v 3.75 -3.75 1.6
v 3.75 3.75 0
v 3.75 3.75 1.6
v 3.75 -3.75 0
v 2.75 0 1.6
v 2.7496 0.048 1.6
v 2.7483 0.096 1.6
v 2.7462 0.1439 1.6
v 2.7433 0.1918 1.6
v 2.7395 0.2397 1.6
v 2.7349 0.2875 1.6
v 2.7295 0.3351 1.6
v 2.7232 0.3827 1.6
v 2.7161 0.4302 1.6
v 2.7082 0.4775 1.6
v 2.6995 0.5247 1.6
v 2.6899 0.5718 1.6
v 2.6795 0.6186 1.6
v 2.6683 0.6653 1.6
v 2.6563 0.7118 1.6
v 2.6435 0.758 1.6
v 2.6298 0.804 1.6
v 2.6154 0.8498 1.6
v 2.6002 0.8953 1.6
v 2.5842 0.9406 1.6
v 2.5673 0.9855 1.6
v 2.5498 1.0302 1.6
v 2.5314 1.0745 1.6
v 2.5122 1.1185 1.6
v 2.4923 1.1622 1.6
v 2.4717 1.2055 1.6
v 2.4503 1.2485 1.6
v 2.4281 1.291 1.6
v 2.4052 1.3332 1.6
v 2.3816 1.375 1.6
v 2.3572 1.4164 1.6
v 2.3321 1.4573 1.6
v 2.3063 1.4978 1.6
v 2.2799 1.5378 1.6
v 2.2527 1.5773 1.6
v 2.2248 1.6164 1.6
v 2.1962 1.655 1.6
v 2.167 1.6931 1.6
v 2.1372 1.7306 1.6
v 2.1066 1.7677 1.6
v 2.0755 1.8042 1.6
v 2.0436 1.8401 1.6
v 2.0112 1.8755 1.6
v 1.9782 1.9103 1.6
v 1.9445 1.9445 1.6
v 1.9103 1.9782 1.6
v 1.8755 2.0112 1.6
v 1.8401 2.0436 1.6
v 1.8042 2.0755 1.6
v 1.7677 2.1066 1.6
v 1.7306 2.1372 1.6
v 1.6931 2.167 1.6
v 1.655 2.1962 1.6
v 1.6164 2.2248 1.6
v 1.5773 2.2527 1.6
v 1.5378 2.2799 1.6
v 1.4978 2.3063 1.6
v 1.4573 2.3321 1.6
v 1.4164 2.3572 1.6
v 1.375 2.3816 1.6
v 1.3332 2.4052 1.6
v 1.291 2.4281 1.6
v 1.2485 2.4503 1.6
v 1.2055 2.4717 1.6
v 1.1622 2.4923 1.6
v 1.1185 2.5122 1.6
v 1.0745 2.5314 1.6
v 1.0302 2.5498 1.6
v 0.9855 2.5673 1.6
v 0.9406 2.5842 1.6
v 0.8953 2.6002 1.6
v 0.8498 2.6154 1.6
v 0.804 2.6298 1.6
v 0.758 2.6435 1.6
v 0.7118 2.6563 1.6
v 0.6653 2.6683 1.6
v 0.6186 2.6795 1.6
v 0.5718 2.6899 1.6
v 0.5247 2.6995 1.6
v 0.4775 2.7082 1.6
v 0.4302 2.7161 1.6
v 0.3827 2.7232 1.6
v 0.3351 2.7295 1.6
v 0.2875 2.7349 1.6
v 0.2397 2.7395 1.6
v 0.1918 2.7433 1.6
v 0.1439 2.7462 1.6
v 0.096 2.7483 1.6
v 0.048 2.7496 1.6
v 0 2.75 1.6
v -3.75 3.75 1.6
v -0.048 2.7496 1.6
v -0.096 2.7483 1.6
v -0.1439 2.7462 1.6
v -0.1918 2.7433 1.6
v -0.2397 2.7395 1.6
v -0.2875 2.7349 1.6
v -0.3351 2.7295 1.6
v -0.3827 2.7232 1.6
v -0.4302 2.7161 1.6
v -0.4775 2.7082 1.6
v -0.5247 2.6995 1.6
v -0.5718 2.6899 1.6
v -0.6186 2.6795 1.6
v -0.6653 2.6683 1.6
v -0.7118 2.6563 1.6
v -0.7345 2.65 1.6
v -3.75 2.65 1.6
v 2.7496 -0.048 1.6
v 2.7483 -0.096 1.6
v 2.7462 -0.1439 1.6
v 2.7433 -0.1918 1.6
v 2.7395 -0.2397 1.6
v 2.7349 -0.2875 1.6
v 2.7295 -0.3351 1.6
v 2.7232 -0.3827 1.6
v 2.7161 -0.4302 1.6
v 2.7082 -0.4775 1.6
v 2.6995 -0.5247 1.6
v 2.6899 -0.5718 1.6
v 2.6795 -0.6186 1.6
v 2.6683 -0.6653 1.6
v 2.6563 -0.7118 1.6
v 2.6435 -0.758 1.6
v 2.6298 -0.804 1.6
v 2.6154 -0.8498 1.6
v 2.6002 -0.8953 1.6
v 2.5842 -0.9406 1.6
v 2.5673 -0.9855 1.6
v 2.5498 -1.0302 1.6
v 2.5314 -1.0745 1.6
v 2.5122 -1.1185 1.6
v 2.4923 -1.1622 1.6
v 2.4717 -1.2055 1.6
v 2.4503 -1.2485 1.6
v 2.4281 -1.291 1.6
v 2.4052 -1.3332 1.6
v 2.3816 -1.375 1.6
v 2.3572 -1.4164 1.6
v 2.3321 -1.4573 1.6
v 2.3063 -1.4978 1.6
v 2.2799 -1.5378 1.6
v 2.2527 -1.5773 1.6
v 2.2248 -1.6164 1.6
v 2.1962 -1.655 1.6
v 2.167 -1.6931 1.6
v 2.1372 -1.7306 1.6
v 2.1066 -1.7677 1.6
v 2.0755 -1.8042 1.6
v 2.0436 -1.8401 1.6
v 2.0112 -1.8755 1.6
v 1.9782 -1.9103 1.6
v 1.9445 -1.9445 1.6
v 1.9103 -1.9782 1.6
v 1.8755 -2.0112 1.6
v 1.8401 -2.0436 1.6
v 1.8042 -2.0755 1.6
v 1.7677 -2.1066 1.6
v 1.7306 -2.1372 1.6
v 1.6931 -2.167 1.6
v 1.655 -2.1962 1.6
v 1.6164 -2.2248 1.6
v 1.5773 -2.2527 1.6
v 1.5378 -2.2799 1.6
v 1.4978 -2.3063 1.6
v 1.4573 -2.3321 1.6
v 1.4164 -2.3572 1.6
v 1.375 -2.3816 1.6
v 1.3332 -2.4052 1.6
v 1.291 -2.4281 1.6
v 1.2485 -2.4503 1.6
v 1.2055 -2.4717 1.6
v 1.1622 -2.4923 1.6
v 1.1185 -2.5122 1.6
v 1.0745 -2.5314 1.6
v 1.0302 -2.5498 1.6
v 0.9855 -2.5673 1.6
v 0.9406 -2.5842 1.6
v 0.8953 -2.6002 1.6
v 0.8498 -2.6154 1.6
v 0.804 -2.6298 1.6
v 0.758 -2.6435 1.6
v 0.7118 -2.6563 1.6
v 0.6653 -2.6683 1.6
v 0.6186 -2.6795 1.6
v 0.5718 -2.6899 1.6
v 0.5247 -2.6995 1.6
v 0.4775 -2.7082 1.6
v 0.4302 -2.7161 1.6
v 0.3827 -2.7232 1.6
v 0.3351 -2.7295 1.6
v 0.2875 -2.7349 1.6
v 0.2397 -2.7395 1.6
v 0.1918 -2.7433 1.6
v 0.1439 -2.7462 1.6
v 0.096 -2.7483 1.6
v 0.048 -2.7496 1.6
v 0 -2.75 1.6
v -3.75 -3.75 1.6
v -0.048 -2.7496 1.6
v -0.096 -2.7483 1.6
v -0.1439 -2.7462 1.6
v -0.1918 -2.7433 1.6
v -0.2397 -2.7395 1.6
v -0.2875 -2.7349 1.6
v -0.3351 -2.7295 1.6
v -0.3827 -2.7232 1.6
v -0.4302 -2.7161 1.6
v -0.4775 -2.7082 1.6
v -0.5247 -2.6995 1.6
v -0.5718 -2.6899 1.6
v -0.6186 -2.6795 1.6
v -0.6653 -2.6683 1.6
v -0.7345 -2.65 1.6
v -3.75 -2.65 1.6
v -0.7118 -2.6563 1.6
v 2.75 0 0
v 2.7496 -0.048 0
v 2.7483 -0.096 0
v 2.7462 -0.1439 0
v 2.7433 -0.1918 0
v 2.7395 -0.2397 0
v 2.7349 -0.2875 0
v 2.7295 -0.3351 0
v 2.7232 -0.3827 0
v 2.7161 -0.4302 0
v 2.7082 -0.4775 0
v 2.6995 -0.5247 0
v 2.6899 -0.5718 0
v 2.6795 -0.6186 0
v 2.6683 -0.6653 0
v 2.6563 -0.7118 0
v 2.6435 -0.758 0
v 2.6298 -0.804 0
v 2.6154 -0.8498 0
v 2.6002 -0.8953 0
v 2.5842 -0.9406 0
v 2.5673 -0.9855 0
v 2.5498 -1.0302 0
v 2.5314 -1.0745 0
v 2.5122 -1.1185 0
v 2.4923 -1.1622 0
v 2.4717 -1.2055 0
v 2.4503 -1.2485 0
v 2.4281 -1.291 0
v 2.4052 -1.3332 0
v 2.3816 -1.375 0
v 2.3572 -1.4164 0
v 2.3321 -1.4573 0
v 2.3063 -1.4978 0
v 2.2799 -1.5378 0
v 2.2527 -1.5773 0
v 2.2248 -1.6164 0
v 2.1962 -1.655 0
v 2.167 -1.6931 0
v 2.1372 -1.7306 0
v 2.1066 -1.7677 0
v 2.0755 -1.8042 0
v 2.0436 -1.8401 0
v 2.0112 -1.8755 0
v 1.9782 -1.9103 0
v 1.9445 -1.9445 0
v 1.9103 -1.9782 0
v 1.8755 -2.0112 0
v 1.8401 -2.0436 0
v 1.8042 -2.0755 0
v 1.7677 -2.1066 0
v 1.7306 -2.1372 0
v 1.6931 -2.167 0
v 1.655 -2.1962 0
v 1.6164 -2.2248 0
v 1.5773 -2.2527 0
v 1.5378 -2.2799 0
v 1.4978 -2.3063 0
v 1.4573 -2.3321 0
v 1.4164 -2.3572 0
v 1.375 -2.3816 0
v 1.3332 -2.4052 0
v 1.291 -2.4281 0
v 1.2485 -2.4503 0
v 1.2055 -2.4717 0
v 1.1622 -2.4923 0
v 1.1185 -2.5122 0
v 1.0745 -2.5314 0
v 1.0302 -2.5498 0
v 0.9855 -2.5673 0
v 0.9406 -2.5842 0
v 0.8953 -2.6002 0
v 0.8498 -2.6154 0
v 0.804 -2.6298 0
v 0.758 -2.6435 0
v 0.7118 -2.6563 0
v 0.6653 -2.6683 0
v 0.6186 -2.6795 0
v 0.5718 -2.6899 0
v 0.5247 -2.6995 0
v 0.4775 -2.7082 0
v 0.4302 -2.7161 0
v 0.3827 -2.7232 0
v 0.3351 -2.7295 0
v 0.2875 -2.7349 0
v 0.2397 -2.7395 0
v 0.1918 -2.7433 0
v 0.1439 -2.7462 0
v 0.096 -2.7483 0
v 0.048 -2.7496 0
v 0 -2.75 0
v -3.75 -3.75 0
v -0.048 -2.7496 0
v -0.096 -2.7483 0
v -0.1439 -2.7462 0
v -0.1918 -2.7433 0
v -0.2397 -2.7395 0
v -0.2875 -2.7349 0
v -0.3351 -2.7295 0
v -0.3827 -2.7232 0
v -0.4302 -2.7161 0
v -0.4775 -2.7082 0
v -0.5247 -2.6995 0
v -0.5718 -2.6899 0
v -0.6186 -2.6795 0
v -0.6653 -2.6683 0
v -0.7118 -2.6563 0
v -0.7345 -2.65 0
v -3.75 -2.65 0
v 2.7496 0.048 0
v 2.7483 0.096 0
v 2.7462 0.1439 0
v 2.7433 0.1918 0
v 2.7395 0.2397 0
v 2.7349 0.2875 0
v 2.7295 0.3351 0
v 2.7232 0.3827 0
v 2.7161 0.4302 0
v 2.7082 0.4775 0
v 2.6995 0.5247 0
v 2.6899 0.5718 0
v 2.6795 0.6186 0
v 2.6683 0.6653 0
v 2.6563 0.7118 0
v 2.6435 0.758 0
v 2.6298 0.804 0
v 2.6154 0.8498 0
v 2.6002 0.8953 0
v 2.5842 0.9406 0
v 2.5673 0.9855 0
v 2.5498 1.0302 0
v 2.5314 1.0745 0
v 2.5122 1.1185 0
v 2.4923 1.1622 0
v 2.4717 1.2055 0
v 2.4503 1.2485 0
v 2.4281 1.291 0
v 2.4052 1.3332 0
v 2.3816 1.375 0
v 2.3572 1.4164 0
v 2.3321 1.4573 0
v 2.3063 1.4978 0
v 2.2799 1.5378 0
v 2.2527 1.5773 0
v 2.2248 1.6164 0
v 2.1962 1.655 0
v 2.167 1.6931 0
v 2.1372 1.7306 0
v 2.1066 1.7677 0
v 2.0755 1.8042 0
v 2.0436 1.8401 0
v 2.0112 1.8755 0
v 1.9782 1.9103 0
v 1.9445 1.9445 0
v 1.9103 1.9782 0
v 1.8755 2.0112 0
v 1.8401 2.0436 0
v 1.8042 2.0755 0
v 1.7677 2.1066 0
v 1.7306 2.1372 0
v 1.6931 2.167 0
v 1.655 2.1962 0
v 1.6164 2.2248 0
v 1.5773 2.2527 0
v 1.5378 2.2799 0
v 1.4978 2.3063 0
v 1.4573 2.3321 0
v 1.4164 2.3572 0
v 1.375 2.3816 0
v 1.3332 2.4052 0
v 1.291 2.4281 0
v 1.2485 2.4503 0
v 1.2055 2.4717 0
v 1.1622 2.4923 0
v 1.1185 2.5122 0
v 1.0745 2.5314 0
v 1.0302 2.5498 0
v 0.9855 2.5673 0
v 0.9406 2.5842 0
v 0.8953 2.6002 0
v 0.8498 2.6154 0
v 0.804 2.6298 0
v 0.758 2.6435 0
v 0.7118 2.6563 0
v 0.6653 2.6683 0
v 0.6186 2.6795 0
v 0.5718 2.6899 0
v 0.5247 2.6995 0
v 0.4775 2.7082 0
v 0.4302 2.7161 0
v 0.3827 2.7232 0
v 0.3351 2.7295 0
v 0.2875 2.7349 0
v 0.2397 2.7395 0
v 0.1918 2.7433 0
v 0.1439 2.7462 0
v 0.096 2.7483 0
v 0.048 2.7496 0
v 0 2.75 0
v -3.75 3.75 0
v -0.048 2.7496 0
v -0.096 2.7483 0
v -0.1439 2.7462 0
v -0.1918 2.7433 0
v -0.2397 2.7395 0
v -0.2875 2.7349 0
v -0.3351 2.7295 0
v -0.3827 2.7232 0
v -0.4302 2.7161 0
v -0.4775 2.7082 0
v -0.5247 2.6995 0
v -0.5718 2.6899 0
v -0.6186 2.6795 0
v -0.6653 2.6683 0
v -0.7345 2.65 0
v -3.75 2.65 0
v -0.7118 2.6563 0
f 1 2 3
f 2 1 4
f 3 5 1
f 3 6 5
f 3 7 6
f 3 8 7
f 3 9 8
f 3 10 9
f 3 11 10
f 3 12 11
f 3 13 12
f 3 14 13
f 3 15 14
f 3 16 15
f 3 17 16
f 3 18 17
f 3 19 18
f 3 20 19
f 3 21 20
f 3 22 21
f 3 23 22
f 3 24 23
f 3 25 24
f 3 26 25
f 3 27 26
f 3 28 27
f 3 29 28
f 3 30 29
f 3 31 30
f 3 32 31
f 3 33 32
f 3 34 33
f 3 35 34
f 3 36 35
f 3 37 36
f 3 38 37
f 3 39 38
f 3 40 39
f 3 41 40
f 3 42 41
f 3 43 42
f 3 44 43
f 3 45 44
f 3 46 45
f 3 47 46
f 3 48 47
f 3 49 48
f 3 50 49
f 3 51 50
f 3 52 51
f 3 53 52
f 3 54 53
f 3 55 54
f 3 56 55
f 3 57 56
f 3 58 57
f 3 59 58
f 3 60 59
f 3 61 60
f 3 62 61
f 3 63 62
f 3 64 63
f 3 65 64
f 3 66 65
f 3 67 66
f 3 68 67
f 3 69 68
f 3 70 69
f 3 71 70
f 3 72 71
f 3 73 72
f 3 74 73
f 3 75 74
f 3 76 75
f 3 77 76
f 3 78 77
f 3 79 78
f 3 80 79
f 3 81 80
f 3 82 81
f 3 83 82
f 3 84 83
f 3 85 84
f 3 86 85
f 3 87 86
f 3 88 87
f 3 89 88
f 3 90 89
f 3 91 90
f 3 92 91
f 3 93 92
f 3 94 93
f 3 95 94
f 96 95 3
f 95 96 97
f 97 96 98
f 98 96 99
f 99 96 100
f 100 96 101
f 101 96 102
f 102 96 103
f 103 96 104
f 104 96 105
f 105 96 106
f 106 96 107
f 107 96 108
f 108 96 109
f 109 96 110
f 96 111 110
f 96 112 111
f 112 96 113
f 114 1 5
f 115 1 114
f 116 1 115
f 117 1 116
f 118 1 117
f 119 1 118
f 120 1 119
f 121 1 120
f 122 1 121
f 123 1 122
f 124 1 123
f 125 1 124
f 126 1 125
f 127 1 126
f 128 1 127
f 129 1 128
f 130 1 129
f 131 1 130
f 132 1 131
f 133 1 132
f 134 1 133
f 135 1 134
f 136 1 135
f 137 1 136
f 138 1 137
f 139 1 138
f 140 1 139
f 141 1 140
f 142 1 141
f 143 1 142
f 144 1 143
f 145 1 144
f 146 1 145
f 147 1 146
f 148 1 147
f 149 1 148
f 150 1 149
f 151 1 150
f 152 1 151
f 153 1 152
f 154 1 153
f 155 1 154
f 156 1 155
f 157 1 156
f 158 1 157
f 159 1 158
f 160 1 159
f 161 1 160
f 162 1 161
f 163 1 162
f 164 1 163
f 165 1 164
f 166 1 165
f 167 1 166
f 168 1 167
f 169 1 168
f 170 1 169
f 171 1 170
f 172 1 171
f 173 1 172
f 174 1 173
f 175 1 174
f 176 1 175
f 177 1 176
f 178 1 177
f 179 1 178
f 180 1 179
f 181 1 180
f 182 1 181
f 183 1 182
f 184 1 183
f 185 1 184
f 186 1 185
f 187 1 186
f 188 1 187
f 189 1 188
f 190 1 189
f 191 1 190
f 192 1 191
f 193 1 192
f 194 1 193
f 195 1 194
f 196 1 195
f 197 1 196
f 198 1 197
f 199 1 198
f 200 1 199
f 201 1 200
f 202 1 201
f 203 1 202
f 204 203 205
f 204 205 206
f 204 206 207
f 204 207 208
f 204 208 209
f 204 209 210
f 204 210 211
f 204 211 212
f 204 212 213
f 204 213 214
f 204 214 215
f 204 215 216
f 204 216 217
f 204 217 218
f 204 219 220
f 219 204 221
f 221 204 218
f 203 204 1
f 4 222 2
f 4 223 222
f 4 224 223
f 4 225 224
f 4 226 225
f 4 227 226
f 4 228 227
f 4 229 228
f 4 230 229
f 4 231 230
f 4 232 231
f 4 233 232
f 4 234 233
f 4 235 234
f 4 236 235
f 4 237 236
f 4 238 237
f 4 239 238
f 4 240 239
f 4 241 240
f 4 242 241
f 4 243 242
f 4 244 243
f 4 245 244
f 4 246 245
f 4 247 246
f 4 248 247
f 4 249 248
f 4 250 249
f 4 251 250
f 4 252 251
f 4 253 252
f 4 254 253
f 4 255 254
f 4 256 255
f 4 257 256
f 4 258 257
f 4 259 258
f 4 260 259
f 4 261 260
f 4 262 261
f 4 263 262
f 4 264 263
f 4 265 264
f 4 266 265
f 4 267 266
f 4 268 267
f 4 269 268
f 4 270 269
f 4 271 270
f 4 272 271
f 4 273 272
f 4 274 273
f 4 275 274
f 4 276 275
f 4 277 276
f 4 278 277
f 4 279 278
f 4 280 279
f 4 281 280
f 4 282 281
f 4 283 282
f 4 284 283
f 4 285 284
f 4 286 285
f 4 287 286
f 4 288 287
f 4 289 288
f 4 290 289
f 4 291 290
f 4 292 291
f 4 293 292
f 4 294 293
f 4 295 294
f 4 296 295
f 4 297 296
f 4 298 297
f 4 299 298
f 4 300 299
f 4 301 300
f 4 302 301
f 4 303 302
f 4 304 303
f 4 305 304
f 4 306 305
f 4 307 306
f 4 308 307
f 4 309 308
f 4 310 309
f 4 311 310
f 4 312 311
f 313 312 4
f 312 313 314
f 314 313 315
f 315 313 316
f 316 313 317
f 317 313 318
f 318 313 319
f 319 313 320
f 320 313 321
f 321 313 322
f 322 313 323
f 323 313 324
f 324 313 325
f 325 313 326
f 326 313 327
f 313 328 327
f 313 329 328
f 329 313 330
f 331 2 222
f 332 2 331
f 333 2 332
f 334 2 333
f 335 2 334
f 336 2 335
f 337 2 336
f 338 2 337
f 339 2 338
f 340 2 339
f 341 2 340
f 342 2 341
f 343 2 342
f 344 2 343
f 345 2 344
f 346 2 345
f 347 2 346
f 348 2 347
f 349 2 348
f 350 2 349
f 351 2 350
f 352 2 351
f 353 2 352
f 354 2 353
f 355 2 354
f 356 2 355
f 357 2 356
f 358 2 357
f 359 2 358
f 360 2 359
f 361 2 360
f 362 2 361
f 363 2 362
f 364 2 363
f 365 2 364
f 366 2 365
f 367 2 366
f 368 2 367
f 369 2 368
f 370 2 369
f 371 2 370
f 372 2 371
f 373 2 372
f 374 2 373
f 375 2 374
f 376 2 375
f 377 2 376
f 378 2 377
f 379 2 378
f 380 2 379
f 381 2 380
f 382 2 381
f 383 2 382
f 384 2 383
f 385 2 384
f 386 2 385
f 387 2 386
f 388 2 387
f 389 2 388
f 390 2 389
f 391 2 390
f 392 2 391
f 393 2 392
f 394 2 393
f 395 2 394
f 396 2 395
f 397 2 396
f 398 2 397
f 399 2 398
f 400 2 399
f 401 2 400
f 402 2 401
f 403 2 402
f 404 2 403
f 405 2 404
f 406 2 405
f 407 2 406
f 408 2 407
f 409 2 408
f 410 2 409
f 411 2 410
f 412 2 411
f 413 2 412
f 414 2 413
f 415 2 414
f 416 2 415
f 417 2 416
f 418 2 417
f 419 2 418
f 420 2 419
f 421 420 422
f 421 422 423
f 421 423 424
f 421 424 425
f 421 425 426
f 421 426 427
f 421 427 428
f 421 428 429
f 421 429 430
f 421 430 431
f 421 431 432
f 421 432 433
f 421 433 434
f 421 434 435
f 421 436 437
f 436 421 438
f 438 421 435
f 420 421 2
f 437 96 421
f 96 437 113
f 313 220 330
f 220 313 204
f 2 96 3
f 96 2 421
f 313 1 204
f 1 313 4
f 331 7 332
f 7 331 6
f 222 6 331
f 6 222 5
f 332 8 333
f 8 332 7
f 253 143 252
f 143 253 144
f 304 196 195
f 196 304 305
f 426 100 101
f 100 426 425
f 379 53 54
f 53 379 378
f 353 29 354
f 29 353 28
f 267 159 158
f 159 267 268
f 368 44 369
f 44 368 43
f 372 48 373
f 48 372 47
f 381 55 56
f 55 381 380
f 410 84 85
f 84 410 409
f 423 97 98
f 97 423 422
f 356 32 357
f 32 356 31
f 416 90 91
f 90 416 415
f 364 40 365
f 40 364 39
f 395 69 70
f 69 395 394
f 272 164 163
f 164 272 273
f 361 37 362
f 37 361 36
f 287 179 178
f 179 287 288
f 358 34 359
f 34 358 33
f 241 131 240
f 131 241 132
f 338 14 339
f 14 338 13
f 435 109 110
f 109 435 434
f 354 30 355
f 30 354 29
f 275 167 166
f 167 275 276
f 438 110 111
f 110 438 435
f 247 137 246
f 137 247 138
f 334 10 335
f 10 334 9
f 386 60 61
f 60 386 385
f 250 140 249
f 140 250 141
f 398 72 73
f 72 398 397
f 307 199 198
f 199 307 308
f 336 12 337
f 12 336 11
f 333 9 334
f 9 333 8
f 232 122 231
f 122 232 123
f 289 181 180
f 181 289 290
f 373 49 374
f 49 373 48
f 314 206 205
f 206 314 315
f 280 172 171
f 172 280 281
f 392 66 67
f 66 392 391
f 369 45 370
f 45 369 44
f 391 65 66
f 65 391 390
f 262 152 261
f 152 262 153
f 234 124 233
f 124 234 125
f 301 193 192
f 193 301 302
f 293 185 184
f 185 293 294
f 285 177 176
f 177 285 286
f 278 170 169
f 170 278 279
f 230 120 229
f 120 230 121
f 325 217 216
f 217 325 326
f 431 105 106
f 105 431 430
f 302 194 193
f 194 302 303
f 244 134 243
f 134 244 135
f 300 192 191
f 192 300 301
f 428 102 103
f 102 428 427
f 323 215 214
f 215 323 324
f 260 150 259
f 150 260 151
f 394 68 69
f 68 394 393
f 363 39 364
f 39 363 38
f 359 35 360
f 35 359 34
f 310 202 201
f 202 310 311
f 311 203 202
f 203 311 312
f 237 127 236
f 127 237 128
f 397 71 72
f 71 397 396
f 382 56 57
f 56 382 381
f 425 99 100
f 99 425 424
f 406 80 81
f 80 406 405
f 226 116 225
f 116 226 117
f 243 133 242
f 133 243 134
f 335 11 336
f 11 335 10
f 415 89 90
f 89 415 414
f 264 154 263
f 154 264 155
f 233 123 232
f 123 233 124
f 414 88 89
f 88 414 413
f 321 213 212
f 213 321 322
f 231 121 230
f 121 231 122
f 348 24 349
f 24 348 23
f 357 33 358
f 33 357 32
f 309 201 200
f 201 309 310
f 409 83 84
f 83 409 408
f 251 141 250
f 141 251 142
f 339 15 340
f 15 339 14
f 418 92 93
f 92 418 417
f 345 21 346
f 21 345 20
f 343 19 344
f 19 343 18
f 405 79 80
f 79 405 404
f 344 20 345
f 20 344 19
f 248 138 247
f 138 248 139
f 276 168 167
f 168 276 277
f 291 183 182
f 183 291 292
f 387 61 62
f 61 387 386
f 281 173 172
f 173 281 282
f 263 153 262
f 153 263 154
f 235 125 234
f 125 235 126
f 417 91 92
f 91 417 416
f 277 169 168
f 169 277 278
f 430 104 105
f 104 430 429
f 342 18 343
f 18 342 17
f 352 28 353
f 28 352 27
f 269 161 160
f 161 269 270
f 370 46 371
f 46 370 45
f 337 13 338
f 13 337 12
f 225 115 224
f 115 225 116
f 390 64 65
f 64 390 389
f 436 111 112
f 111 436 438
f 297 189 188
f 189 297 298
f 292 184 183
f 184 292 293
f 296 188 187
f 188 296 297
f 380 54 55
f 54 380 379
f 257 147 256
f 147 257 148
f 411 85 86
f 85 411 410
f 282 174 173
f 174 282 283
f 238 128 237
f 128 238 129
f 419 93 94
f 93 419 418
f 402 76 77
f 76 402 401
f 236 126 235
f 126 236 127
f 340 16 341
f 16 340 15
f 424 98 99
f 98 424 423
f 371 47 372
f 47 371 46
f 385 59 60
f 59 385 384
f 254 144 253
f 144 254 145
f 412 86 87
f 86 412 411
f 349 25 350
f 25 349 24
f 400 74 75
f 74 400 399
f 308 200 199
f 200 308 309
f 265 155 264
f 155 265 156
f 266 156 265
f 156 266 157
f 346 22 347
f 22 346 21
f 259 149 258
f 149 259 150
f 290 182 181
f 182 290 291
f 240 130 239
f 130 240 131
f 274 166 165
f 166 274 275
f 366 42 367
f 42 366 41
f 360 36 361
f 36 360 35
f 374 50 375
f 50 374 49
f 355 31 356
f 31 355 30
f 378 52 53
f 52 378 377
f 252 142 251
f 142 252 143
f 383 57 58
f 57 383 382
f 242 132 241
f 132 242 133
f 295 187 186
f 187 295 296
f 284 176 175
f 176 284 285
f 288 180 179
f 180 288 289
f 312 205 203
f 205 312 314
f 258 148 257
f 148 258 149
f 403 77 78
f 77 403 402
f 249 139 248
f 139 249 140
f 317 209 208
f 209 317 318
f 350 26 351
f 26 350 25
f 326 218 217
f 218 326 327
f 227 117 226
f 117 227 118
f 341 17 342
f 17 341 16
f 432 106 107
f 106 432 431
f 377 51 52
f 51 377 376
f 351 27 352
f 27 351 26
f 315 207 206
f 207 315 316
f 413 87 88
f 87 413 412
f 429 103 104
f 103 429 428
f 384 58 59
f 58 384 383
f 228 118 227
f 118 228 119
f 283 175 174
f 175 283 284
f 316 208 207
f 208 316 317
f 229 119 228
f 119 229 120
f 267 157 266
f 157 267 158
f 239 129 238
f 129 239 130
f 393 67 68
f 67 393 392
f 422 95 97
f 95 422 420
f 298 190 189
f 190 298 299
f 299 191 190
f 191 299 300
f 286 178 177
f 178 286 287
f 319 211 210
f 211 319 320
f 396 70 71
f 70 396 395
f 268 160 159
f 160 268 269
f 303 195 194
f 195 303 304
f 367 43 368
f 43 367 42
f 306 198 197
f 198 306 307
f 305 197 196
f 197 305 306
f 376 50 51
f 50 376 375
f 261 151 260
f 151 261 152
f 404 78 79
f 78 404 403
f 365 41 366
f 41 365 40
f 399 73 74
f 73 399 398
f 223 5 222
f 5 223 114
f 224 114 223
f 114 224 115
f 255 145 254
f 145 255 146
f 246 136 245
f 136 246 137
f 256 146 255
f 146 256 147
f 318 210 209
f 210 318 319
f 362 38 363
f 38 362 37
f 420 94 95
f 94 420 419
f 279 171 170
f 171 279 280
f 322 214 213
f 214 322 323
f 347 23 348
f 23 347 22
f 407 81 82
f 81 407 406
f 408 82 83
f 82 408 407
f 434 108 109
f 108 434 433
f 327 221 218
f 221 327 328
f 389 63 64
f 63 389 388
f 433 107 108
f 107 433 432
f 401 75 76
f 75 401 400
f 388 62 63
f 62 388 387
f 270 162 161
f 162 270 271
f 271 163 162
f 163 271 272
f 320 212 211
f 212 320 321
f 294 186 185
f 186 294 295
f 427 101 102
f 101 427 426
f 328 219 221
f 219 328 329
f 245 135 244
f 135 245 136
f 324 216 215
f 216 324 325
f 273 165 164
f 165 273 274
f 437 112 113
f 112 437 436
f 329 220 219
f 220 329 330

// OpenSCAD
$fn=360;
difference() {
    translate([0,0,.8]) cube([7.5,7.5,1.6],true);
    cylinder(1.6,d=5.5);
    translate([-7.5/2,-5.3/2,0]) cube([4.2,5.3,1.6]);
}
